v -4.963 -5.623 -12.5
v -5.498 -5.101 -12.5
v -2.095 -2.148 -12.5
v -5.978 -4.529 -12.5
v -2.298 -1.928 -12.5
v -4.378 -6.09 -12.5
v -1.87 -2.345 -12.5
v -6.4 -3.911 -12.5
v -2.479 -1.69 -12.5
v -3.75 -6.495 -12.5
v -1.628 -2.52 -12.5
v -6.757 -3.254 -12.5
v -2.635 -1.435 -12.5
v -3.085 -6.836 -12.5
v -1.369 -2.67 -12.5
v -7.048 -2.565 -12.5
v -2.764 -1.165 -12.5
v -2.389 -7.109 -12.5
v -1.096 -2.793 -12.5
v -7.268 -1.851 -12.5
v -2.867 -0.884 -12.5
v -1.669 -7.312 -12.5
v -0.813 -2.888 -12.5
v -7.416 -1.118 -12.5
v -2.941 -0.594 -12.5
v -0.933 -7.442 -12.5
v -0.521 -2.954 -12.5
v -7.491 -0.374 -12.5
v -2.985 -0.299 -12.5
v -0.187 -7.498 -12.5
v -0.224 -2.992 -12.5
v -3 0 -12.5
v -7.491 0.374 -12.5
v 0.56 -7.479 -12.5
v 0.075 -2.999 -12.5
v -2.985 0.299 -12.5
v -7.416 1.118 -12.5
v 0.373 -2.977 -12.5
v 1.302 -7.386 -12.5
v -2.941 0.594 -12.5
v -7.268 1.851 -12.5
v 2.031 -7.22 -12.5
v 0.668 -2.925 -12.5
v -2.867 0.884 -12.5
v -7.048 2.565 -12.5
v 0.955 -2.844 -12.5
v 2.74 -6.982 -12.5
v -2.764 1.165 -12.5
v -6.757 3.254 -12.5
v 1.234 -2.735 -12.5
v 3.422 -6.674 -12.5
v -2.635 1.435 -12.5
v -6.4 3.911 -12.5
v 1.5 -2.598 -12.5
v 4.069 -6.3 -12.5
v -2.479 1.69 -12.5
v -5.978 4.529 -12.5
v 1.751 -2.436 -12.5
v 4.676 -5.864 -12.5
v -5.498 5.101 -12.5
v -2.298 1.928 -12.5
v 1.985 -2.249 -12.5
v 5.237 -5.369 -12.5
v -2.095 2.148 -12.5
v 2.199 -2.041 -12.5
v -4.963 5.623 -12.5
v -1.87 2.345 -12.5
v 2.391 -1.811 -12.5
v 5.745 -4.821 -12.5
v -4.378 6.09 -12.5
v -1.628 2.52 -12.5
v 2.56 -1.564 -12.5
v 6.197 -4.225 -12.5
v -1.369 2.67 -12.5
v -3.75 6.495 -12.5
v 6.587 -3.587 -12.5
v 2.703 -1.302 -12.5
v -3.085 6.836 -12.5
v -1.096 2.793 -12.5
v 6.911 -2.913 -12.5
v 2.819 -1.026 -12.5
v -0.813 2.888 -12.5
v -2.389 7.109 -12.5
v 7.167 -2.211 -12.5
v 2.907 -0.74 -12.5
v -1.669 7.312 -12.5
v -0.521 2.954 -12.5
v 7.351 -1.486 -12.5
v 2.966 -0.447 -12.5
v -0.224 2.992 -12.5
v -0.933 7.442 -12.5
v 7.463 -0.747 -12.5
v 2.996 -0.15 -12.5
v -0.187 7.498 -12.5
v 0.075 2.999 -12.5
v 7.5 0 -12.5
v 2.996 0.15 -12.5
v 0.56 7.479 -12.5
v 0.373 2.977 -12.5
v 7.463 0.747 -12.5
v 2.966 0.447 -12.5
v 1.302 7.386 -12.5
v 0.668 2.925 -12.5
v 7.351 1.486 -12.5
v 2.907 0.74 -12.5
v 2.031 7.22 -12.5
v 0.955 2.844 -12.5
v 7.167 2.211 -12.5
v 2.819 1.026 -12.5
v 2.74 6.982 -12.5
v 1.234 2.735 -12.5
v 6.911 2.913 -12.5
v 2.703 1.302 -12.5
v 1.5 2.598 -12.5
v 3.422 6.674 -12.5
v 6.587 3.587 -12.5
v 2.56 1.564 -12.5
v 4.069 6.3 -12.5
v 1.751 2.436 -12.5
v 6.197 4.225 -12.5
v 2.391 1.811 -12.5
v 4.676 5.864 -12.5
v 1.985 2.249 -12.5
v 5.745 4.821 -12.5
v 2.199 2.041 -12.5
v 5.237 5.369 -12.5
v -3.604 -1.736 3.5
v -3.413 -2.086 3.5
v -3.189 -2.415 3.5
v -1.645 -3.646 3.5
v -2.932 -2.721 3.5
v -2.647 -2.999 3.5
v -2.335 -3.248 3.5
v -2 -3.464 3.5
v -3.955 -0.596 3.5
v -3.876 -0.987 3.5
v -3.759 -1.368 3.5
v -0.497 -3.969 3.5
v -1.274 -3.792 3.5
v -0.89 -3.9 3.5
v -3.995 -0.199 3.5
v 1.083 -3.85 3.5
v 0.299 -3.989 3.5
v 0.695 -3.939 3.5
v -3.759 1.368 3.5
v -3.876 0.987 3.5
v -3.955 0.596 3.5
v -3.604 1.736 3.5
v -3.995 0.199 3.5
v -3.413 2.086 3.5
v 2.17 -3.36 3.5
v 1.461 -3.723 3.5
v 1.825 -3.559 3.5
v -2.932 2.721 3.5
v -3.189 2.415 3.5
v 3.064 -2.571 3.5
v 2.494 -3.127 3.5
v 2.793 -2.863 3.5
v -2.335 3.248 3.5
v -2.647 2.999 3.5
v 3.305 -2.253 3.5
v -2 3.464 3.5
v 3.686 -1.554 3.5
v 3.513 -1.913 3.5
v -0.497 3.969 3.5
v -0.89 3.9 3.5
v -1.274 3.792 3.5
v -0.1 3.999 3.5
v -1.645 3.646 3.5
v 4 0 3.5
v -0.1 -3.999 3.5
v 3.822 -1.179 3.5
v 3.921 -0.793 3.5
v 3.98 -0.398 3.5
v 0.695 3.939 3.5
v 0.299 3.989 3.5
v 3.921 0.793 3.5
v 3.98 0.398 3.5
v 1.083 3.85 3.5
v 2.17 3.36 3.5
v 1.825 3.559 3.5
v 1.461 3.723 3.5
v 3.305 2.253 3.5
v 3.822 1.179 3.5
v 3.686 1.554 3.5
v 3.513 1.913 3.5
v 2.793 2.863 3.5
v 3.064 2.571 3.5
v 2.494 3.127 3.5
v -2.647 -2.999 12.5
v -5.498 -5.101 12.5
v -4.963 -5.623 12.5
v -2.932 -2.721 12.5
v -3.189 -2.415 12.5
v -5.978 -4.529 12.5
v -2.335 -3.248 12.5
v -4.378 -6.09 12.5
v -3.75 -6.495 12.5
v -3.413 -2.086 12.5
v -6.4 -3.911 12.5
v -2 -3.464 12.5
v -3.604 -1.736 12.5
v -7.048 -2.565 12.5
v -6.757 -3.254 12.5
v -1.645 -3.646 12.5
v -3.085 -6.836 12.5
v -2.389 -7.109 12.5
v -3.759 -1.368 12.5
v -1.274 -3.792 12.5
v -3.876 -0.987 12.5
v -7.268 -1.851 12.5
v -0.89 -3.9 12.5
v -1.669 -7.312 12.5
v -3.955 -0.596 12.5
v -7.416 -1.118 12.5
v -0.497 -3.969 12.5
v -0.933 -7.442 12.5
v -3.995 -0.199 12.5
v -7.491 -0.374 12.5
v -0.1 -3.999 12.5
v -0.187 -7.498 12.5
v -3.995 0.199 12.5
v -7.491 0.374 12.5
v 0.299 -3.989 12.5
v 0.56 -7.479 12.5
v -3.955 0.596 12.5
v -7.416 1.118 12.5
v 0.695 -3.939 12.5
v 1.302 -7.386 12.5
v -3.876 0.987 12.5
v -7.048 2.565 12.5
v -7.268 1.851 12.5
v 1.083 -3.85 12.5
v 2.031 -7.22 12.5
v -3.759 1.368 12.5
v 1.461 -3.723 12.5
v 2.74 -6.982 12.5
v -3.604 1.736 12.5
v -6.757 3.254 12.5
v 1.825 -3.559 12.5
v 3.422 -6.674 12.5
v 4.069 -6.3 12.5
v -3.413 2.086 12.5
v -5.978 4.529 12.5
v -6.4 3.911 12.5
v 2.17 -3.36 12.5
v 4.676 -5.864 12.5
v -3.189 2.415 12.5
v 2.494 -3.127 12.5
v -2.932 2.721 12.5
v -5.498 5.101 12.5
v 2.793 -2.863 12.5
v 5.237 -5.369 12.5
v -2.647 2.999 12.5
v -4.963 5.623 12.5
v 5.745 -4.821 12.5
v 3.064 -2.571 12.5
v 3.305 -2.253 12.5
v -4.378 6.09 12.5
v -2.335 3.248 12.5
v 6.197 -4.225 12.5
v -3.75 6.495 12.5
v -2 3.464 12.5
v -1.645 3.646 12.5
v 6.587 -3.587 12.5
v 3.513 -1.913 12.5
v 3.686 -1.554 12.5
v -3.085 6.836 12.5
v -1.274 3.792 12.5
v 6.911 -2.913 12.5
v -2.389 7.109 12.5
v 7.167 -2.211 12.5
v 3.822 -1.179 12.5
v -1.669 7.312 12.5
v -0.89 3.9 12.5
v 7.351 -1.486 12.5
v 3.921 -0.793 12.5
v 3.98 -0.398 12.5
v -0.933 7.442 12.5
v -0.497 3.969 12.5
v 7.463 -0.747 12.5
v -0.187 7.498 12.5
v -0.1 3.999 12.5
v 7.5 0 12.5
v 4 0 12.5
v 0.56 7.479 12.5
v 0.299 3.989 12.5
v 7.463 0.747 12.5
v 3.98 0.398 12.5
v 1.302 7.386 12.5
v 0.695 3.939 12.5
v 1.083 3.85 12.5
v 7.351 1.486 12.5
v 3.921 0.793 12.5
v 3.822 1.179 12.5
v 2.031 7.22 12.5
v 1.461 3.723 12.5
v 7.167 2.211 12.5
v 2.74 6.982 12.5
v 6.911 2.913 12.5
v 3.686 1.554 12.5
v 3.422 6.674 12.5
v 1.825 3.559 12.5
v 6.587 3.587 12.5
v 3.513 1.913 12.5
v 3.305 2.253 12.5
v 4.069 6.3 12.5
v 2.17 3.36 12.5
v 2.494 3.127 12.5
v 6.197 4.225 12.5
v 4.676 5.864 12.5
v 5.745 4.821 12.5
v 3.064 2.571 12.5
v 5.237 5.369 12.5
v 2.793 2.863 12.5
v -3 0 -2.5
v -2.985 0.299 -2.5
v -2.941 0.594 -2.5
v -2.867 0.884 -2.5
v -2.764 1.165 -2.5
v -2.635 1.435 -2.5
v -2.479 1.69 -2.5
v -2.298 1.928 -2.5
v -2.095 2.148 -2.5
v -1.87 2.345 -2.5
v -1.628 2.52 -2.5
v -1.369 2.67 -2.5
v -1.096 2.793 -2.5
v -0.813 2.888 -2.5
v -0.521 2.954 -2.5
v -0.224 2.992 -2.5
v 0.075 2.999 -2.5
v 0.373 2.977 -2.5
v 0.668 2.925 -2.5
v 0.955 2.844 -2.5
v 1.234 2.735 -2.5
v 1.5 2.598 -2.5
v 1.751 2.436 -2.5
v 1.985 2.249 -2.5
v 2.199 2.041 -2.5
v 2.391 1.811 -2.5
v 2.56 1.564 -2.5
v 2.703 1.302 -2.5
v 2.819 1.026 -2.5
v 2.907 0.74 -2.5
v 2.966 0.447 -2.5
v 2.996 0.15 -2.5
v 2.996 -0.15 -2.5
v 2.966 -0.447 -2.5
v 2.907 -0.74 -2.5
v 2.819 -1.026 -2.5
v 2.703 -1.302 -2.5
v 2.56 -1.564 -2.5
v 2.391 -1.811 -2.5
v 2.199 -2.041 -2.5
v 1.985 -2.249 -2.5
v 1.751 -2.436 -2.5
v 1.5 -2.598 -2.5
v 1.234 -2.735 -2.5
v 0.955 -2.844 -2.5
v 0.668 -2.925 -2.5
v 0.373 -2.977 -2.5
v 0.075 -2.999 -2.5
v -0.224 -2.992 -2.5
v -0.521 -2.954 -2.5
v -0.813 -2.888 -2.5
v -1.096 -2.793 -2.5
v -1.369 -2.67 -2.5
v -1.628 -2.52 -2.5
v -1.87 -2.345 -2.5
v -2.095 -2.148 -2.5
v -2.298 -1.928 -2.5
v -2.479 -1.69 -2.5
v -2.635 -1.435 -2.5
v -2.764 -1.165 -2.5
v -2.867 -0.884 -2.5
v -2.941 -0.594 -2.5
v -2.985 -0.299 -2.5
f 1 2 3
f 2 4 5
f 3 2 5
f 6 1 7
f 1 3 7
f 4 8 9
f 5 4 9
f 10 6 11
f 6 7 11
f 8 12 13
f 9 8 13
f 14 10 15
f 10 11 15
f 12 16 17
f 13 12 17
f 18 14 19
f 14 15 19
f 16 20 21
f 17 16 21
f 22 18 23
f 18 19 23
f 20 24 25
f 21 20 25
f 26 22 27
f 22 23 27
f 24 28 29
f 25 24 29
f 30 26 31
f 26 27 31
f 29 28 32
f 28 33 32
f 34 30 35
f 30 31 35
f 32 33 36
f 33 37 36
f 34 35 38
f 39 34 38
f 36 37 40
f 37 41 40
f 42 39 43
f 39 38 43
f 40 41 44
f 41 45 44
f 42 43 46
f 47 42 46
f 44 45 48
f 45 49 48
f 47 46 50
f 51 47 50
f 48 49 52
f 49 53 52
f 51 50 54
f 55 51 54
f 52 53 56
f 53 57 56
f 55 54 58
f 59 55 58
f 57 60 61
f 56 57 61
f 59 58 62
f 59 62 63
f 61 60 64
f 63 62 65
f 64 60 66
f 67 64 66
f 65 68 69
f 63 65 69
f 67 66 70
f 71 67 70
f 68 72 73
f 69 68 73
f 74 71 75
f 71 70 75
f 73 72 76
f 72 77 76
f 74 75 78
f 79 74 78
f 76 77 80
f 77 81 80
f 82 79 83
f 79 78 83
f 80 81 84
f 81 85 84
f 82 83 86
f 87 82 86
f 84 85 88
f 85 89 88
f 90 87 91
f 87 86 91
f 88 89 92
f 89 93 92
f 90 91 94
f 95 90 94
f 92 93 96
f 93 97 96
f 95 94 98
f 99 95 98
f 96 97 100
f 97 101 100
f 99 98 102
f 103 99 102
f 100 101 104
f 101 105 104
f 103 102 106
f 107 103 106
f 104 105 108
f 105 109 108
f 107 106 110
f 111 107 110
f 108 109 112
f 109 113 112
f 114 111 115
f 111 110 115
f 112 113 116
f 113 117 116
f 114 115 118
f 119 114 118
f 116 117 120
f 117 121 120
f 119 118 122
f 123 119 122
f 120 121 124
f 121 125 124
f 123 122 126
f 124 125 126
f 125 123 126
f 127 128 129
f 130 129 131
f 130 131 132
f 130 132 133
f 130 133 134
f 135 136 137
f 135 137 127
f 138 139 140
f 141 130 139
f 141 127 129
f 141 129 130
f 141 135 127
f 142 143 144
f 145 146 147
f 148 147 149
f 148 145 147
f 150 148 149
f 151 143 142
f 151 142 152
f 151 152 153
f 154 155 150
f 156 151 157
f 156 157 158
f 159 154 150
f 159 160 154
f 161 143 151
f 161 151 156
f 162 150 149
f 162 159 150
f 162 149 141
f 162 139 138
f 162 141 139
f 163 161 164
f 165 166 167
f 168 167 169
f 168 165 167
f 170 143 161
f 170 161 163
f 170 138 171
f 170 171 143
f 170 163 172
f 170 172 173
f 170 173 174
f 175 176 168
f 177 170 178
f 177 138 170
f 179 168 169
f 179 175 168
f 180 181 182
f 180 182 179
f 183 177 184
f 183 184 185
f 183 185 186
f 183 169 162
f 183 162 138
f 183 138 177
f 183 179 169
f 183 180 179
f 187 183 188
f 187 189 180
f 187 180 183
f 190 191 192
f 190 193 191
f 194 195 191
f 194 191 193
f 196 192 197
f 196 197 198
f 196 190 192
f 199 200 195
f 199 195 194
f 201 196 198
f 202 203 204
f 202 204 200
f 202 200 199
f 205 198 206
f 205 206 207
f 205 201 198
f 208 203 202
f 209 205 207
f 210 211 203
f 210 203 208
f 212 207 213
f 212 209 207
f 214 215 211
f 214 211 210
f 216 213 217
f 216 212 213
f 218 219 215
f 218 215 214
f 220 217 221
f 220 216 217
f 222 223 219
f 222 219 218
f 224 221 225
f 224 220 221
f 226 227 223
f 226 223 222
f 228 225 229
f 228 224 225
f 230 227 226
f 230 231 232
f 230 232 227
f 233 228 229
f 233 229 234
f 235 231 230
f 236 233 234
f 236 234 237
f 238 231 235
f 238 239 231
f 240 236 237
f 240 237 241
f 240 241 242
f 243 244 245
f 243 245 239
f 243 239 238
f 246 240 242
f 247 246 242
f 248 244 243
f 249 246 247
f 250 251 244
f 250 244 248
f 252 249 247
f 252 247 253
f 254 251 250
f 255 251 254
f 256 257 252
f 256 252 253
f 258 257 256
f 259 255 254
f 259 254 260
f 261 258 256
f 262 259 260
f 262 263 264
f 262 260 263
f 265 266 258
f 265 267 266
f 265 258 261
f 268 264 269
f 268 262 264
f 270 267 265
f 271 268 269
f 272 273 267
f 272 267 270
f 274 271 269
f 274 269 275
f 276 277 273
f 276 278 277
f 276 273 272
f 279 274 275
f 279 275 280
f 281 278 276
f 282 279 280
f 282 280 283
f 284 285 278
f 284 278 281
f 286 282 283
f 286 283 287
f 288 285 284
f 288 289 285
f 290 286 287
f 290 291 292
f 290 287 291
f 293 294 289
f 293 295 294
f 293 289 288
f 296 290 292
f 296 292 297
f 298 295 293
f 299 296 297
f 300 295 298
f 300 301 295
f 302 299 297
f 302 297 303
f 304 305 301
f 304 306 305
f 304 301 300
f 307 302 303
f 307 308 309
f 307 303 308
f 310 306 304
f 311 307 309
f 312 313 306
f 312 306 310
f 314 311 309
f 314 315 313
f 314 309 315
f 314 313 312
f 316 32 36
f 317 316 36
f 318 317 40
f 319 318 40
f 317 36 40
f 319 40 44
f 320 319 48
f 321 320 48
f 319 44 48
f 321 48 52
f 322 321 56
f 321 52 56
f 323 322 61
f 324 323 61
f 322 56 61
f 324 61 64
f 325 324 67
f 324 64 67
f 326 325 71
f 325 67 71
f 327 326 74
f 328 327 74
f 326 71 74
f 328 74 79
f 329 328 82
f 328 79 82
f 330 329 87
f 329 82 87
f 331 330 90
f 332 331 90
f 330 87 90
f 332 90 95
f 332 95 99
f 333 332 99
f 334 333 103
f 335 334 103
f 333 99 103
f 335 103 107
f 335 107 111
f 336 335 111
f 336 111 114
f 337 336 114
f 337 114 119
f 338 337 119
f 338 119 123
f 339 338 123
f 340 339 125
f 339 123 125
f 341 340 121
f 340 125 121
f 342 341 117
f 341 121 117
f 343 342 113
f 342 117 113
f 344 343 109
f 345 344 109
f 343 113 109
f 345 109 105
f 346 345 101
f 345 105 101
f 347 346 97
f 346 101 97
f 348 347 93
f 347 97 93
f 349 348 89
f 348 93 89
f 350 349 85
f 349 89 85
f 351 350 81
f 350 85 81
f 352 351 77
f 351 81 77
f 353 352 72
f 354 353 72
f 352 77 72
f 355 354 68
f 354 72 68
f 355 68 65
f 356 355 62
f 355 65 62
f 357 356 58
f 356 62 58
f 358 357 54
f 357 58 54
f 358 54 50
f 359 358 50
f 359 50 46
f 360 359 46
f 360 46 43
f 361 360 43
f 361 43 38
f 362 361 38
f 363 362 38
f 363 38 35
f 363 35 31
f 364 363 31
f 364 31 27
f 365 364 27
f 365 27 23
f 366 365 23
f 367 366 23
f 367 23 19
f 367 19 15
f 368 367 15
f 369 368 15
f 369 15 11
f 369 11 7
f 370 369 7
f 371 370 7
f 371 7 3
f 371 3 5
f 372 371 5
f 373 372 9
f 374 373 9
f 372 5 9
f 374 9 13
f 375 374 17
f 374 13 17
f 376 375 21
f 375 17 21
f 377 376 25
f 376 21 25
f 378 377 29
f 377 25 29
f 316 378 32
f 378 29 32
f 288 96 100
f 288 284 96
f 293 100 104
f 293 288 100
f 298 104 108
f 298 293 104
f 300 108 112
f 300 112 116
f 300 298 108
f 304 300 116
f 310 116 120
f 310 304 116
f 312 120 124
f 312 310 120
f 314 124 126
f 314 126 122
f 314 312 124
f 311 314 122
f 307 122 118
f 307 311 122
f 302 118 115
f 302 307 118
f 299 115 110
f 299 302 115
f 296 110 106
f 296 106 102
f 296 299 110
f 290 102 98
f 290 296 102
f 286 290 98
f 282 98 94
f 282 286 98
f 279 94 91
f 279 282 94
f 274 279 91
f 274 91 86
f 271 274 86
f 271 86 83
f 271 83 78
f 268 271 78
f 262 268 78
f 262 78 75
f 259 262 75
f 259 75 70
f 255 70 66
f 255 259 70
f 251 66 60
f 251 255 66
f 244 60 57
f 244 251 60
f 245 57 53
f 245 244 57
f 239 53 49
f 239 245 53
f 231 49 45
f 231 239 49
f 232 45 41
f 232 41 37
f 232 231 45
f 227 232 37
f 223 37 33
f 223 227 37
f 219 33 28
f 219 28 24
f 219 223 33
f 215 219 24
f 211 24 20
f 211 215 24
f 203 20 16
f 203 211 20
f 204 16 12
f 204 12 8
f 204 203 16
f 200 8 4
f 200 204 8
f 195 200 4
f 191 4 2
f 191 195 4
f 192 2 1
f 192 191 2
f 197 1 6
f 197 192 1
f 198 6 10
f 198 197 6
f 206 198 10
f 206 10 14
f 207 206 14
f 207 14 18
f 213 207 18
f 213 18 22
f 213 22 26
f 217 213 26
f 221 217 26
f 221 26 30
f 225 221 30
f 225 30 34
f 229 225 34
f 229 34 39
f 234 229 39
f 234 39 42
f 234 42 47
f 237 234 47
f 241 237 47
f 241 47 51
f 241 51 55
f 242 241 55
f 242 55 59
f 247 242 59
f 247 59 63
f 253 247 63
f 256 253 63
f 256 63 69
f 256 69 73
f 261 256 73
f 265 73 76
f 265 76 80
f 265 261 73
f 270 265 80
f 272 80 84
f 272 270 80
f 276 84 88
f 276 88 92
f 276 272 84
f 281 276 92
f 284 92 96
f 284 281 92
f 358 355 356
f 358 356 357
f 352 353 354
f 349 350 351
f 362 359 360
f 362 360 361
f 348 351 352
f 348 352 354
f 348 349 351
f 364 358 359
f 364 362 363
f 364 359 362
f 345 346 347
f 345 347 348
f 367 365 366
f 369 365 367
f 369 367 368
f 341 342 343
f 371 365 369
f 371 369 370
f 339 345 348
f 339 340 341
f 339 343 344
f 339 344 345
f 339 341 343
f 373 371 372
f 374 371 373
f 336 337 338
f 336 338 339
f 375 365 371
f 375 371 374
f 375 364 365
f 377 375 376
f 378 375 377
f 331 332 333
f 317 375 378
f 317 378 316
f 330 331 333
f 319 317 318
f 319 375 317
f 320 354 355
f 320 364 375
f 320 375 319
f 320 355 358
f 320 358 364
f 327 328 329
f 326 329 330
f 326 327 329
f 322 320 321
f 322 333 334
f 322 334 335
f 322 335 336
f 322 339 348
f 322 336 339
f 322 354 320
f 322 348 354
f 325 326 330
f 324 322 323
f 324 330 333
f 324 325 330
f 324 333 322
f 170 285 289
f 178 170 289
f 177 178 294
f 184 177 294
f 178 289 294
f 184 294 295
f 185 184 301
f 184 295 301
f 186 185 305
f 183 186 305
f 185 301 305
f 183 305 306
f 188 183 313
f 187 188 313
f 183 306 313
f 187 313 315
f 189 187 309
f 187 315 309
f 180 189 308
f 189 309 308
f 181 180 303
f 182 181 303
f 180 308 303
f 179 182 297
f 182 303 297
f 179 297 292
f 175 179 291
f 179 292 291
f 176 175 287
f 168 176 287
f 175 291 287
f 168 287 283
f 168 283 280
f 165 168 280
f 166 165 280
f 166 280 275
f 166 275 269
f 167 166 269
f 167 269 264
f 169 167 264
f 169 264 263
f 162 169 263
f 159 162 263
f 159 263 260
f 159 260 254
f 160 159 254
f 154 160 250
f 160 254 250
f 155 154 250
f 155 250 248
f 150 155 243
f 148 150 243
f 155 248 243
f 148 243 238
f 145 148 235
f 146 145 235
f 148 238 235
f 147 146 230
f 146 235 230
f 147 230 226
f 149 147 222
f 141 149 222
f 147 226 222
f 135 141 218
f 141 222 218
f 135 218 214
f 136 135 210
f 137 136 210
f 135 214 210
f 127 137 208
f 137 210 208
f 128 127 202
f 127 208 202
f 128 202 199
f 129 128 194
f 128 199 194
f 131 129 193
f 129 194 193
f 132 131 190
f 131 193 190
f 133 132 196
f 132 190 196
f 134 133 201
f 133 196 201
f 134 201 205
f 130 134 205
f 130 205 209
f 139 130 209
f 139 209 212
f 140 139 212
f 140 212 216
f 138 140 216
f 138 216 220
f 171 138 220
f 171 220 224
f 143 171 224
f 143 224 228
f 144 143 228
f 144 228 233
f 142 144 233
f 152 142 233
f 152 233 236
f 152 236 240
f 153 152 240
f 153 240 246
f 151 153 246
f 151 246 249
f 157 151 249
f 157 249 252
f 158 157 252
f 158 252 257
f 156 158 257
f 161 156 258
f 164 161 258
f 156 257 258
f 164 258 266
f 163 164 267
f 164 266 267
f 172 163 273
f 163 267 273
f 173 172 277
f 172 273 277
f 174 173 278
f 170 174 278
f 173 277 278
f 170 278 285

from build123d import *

# Parameters (mm, degrees)
SKETCH_1_R          = 7.5
EXTRUDE_1_DEPTH     = 12.5
SKETCH_2_R          = 3
CUT_EXTRUDE_1_DEPTH = 10
SKETCH_3_R          = 4
CUT_EXTRUDE_2_DEPTH = 9


with BuildPart() as part:
    # 草图1 → 凸台-拉伸1 (new, symmetric)
    with BuildSketch(Plane.XY):
        Circle(SKETCH_1_R)
    extrude(amount=EXTRUDE_1_DEPTH, both=True)

    # 草图2 → 切除-拉伸1 (cut)
    with BuildSketch(Plane(origin=(0, 0, -12.5), x_dir=(-1, 0, 0), z_dir=(0, 0, -1))):
        Circle(SKETCH_2_R)
    extrude(amount=-CUT_EXTRUDE_1_DEPTH, mode=Mode.SUBTRACT)

    # 草图3 → 切除-拉伸2 (cut)
    with BuildSketch(Plane.XY.offset(12.5)):
        Circle(SKETCH_3_R)
    extrude(amount=-CUT_EXTRUDE_2_DEPTH, mode=Mode.SUBTRACT)


solid = part.part
